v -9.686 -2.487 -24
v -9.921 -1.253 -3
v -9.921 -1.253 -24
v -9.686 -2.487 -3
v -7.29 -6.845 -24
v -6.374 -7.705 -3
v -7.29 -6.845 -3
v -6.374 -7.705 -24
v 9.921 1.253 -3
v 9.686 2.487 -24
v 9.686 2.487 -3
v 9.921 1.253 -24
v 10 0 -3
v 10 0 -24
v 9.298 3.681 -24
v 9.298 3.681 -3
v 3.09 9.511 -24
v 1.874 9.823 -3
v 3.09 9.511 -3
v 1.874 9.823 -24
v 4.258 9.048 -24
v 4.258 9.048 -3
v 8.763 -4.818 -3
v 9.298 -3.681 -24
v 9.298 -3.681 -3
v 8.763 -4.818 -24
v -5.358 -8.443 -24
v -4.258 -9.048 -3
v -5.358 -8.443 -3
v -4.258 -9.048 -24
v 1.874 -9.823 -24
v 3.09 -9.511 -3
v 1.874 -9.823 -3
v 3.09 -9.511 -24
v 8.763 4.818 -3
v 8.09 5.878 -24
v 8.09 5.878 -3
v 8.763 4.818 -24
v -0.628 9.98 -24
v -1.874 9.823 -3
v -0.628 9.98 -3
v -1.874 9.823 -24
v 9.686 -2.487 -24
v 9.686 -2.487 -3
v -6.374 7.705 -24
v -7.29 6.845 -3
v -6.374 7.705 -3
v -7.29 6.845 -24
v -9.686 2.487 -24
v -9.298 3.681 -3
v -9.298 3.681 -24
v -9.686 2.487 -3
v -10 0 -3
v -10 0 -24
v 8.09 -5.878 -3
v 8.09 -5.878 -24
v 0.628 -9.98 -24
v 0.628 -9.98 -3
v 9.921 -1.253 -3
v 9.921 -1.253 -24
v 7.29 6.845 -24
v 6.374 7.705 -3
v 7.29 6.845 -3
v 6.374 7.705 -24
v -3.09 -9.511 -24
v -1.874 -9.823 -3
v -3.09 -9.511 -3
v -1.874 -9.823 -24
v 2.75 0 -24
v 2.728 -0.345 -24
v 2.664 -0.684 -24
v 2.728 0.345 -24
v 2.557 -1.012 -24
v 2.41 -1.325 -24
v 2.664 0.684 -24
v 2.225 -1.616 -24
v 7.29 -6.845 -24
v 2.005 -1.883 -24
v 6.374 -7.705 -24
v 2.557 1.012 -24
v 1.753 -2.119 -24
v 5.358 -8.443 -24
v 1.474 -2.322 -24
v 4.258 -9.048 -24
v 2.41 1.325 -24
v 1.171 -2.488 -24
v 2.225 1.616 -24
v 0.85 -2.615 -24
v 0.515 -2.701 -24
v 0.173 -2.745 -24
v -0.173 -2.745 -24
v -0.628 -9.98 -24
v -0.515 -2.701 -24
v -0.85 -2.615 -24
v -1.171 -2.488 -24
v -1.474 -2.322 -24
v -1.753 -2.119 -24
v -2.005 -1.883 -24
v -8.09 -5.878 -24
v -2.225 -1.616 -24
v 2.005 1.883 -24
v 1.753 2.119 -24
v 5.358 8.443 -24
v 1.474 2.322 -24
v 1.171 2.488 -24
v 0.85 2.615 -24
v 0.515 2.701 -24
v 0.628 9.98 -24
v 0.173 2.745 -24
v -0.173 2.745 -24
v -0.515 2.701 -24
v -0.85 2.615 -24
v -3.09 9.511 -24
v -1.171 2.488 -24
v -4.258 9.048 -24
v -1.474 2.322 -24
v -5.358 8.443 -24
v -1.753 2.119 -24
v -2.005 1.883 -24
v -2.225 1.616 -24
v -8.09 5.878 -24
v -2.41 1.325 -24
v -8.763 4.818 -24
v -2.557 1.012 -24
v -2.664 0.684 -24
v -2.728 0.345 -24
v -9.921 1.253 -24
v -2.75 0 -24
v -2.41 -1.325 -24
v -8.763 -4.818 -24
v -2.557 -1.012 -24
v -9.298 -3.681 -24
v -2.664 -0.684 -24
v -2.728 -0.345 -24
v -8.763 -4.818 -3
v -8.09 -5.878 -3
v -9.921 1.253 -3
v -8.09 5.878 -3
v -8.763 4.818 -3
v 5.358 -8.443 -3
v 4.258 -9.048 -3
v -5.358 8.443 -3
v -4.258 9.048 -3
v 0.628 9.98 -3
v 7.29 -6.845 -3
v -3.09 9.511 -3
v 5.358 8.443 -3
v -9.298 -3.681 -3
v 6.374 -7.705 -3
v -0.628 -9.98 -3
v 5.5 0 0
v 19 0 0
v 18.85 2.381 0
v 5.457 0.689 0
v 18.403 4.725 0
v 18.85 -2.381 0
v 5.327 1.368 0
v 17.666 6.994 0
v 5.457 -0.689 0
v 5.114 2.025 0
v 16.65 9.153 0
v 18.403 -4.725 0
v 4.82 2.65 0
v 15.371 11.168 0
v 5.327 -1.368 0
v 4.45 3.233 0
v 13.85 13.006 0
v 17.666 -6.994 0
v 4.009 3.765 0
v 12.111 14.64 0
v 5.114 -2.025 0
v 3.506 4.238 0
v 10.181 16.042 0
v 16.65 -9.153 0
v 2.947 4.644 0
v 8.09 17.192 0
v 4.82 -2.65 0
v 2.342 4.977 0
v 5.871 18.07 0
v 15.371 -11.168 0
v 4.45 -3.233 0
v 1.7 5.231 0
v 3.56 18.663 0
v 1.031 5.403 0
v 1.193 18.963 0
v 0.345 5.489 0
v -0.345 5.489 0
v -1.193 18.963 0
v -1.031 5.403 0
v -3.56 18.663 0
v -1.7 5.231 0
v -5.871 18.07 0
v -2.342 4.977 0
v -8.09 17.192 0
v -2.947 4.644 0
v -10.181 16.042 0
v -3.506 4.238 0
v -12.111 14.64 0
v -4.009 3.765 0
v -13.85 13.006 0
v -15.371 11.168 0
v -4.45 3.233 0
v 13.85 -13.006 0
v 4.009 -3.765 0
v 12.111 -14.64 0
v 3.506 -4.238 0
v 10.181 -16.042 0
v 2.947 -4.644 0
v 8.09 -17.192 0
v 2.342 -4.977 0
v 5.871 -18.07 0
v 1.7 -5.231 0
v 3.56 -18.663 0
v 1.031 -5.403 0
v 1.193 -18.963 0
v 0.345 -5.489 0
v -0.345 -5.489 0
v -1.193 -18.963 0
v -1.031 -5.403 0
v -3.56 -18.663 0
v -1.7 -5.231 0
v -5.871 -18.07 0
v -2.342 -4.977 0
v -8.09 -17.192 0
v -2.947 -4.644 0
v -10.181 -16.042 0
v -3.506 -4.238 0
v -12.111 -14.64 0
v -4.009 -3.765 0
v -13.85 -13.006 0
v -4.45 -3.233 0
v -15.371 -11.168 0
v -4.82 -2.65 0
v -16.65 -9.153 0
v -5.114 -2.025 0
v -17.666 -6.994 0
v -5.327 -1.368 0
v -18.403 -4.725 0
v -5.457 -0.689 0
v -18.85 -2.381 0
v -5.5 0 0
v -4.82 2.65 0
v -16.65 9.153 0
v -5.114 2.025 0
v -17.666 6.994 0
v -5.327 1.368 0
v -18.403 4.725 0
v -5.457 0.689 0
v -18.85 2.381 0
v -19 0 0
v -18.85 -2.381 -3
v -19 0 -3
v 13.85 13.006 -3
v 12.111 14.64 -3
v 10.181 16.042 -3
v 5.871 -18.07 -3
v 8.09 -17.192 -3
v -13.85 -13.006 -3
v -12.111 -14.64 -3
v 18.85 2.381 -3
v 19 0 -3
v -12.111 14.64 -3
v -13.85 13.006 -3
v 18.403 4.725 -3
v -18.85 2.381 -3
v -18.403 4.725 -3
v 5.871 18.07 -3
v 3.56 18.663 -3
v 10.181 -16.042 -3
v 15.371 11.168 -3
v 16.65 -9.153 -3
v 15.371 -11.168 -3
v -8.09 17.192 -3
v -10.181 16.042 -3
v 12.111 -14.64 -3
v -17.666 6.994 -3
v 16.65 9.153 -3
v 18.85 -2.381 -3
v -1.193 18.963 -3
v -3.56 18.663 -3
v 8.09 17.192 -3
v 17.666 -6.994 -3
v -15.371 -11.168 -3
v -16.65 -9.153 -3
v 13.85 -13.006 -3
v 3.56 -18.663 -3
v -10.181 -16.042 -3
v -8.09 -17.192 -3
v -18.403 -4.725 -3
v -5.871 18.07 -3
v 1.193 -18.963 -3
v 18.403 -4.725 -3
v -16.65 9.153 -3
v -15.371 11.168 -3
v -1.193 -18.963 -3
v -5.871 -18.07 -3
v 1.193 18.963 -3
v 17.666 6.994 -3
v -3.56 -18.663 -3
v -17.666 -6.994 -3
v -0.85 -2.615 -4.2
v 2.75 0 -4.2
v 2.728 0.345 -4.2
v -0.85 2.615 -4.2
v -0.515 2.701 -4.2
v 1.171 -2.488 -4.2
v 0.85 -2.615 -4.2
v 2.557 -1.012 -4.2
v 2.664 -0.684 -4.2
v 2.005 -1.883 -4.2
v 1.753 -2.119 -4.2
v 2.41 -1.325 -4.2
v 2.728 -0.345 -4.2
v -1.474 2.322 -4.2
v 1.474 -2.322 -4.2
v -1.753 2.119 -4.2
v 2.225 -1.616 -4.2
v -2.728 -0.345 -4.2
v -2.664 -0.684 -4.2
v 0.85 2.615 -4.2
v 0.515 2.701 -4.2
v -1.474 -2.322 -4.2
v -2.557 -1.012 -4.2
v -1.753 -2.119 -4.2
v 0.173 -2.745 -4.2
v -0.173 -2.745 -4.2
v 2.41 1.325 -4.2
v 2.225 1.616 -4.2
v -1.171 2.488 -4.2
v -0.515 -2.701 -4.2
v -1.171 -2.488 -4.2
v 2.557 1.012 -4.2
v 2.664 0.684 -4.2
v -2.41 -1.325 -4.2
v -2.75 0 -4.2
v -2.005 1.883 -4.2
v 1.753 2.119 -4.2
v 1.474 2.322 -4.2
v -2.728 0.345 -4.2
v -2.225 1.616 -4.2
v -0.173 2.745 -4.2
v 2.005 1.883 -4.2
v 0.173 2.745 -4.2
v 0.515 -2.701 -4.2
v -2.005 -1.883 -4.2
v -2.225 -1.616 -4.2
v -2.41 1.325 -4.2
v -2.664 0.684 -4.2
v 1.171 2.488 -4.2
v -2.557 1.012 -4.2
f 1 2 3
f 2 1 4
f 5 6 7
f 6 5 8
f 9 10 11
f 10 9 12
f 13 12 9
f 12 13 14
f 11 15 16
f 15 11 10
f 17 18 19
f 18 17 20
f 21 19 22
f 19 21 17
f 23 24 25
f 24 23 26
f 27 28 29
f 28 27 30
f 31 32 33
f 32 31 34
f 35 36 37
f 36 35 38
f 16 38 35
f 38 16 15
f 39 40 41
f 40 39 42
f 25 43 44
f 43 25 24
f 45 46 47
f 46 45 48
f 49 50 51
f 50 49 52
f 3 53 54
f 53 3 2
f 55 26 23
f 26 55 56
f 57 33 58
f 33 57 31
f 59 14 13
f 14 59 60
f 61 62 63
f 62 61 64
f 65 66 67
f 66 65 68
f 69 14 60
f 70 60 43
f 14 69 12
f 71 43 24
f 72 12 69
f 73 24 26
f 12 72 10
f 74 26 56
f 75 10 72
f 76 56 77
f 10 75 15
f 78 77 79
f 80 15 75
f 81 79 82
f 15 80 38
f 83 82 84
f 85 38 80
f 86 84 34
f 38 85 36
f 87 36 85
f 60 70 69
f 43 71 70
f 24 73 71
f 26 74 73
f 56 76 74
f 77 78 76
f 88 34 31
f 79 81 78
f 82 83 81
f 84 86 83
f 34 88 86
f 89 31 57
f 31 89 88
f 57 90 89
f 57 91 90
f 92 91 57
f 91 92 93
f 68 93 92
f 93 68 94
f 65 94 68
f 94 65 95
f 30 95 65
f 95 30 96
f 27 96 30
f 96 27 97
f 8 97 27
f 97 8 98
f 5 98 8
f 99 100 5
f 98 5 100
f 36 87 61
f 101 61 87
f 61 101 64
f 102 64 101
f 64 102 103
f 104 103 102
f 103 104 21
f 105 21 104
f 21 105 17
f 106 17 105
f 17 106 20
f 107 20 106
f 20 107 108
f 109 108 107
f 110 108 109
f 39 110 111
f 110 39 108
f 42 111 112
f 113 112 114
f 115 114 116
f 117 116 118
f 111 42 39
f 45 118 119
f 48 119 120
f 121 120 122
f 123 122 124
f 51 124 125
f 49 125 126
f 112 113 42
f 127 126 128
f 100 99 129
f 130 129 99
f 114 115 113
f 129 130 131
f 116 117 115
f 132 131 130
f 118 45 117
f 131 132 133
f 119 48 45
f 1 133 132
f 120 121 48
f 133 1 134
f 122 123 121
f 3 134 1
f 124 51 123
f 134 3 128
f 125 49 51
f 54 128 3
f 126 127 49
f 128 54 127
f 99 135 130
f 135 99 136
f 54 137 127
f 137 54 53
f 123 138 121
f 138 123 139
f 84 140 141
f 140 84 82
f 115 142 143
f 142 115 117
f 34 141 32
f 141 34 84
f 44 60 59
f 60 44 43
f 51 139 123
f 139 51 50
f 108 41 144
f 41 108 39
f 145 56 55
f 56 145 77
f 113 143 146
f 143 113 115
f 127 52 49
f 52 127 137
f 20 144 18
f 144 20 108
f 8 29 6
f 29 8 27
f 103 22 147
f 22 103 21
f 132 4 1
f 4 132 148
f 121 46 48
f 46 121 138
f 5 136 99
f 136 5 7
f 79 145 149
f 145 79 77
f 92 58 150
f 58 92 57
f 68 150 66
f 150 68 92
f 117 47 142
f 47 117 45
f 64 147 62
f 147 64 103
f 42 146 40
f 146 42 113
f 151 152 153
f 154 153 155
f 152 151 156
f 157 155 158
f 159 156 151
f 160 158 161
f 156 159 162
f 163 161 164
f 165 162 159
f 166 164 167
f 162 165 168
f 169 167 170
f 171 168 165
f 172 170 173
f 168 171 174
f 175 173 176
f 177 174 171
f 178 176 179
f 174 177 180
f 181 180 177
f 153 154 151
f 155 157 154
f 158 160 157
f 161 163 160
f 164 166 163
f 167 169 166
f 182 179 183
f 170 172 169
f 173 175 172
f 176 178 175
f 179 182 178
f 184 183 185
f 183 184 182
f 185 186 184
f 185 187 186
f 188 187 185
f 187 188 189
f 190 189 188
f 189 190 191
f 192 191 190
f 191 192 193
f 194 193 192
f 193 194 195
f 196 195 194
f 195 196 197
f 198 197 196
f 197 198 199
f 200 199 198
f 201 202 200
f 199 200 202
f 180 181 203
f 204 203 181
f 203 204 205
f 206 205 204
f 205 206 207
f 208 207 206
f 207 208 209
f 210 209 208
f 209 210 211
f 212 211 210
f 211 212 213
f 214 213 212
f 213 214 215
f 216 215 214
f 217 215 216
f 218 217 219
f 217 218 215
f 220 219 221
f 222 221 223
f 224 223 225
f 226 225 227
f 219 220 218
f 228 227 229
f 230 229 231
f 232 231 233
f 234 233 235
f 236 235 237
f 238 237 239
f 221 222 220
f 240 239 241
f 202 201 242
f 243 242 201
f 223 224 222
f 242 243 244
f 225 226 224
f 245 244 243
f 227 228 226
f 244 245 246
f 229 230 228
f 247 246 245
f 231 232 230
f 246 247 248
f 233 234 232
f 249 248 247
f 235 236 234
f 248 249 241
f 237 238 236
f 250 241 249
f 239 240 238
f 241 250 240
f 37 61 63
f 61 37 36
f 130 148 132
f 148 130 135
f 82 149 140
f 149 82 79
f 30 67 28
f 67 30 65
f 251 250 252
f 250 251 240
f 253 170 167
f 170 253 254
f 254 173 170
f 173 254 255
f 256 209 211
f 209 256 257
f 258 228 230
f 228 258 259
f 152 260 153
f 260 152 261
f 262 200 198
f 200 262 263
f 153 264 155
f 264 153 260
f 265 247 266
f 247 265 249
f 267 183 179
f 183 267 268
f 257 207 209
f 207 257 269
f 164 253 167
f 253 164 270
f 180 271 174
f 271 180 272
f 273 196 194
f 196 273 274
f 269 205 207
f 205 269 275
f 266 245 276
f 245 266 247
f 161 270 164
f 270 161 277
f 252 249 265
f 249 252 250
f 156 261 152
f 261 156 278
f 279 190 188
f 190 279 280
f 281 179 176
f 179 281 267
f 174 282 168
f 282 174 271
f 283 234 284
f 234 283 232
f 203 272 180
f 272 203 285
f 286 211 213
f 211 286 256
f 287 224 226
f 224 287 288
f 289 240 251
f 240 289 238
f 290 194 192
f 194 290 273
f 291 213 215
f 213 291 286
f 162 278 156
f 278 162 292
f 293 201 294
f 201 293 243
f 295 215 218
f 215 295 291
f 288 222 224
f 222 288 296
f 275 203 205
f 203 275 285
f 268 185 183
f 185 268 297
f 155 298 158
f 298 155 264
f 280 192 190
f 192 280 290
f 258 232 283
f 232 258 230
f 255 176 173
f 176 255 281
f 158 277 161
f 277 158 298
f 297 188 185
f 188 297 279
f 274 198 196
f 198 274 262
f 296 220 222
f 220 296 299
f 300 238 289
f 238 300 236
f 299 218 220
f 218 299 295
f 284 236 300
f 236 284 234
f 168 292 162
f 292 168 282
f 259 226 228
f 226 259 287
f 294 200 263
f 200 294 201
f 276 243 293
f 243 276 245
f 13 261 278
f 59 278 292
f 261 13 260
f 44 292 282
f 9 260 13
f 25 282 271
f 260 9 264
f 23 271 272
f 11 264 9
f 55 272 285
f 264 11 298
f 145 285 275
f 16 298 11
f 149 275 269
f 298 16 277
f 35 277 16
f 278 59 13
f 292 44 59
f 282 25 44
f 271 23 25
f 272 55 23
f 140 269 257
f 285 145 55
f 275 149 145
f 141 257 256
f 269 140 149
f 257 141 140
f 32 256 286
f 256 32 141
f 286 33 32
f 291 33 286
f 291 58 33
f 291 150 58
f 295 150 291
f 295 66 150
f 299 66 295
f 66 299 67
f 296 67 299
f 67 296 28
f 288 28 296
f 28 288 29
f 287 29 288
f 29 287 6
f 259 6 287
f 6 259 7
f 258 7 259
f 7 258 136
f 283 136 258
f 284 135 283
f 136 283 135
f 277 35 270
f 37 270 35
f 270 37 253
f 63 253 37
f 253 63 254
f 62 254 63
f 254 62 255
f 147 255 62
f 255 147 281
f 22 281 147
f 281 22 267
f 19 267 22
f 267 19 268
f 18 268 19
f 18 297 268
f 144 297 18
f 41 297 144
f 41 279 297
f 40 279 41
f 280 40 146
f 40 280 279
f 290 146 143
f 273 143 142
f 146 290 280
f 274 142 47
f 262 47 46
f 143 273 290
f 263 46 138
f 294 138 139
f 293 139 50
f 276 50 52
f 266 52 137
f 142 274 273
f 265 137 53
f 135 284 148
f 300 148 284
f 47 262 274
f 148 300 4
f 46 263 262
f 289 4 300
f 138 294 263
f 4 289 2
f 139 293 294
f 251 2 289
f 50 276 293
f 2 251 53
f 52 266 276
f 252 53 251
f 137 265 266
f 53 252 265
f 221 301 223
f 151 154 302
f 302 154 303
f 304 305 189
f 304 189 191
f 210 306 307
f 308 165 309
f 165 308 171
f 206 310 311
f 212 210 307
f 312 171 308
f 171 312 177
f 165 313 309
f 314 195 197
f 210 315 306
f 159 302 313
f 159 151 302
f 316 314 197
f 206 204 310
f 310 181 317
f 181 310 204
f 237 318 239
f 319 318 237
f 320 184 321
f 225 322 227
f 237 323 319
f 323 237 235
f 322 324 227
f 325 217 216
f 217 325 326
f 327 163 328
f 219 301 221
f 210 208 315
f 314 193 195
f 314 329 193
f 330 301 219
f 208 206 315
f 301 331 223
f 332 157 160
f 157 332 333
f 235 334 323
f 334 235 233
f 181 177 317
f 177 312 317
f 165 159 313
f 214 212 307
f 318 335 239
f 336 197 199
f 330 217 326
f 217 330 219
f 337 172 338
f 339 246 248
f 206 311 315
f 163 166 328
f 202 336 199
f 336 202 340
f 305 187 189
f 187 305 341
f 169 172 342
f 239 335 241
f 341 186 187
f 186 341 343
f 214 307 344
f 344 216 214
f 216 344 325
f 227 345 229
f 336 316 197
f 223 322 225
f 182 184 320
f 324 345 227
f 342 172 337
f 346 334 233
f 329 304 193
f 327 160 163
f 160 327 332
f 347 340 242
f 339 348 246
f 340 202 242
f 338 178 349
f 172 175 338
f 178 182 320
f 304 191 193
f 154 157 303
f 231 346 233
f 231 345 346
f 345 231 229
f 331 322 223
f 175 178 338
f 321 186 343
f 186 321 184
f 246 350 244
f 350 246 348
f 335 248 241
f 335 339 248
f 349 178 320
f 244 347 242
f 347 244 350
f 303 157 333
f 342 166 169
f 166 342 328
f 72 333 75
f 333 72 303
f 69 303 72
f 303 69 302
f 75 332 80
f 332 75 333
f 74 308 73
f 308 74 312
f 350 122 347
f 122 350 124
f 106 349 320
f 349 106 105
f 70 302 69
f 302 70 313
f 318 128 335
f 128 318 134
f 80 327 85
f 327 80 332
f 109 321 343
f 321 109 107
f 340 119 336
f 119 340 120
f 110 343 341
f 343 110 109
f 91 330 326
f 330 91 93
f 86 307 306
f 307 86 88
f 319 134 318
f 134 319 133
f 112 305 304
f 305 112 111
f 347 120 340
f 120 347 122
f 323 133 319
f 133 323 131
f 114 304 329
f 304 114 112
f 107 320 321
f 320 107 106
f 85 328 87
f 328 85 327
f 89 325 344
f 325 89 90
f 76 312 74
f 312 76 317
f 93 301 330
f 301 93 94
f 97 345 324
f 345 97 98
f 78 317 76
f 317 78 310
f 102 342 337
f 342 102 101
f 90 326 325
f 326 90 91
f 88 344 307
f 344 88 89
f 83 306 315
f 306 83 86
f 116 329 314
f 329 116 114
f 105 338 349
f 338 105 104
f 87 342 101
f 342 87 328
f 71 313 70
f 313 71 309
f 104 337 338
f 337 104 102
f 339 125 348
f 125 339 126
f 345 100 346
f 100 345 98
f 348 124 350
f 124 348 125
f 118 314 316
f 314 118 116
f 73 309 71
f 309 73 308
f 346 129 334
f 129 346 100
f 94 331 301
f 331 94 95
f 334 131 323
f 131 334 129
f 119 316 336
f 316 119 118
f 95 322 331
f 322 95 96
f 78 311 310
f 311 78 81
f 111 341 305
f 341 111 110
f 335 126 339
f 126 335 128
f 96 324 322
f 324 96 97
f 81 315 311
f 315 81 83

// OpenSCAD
$fn = 50;


difference() {
	union() {
		translate(v = [0, 0, -24.0000000000]) {
			cylinder(h = 24, r = 10.0000000000);
		}
		translate(v = [0, 0, -3.0000000000]) {
			cylinder(h = 3, r = 19.0000000000);
		}
	}
	union() {
		translate(v = [0, 0, 0]) {
			rotate(a = [0, 0, 0]) {
				difference() {
					union() {
						#translate(v = [0, 0, -24.0000000000]) {
							cylinder(h = 24, r = 2.2500000000);
						}
						#translate(v = [0, 0, -4.2000000000]) {
							cylinder(h = 4.2000000000, r1 = 2.7500000000, r2 = 5.5000000000);
						}
						#translate(v = [0, 0, -24.0000000000]) {
							cylinder(h = 24, r = 2.7500000000);
						}
						#translate(v = [0, 0, -24.0000000000]) {
							cylinder(h = 24, r = 2.2500000000);
						}
					}
					union();
				}
			}
		}
	}
}
